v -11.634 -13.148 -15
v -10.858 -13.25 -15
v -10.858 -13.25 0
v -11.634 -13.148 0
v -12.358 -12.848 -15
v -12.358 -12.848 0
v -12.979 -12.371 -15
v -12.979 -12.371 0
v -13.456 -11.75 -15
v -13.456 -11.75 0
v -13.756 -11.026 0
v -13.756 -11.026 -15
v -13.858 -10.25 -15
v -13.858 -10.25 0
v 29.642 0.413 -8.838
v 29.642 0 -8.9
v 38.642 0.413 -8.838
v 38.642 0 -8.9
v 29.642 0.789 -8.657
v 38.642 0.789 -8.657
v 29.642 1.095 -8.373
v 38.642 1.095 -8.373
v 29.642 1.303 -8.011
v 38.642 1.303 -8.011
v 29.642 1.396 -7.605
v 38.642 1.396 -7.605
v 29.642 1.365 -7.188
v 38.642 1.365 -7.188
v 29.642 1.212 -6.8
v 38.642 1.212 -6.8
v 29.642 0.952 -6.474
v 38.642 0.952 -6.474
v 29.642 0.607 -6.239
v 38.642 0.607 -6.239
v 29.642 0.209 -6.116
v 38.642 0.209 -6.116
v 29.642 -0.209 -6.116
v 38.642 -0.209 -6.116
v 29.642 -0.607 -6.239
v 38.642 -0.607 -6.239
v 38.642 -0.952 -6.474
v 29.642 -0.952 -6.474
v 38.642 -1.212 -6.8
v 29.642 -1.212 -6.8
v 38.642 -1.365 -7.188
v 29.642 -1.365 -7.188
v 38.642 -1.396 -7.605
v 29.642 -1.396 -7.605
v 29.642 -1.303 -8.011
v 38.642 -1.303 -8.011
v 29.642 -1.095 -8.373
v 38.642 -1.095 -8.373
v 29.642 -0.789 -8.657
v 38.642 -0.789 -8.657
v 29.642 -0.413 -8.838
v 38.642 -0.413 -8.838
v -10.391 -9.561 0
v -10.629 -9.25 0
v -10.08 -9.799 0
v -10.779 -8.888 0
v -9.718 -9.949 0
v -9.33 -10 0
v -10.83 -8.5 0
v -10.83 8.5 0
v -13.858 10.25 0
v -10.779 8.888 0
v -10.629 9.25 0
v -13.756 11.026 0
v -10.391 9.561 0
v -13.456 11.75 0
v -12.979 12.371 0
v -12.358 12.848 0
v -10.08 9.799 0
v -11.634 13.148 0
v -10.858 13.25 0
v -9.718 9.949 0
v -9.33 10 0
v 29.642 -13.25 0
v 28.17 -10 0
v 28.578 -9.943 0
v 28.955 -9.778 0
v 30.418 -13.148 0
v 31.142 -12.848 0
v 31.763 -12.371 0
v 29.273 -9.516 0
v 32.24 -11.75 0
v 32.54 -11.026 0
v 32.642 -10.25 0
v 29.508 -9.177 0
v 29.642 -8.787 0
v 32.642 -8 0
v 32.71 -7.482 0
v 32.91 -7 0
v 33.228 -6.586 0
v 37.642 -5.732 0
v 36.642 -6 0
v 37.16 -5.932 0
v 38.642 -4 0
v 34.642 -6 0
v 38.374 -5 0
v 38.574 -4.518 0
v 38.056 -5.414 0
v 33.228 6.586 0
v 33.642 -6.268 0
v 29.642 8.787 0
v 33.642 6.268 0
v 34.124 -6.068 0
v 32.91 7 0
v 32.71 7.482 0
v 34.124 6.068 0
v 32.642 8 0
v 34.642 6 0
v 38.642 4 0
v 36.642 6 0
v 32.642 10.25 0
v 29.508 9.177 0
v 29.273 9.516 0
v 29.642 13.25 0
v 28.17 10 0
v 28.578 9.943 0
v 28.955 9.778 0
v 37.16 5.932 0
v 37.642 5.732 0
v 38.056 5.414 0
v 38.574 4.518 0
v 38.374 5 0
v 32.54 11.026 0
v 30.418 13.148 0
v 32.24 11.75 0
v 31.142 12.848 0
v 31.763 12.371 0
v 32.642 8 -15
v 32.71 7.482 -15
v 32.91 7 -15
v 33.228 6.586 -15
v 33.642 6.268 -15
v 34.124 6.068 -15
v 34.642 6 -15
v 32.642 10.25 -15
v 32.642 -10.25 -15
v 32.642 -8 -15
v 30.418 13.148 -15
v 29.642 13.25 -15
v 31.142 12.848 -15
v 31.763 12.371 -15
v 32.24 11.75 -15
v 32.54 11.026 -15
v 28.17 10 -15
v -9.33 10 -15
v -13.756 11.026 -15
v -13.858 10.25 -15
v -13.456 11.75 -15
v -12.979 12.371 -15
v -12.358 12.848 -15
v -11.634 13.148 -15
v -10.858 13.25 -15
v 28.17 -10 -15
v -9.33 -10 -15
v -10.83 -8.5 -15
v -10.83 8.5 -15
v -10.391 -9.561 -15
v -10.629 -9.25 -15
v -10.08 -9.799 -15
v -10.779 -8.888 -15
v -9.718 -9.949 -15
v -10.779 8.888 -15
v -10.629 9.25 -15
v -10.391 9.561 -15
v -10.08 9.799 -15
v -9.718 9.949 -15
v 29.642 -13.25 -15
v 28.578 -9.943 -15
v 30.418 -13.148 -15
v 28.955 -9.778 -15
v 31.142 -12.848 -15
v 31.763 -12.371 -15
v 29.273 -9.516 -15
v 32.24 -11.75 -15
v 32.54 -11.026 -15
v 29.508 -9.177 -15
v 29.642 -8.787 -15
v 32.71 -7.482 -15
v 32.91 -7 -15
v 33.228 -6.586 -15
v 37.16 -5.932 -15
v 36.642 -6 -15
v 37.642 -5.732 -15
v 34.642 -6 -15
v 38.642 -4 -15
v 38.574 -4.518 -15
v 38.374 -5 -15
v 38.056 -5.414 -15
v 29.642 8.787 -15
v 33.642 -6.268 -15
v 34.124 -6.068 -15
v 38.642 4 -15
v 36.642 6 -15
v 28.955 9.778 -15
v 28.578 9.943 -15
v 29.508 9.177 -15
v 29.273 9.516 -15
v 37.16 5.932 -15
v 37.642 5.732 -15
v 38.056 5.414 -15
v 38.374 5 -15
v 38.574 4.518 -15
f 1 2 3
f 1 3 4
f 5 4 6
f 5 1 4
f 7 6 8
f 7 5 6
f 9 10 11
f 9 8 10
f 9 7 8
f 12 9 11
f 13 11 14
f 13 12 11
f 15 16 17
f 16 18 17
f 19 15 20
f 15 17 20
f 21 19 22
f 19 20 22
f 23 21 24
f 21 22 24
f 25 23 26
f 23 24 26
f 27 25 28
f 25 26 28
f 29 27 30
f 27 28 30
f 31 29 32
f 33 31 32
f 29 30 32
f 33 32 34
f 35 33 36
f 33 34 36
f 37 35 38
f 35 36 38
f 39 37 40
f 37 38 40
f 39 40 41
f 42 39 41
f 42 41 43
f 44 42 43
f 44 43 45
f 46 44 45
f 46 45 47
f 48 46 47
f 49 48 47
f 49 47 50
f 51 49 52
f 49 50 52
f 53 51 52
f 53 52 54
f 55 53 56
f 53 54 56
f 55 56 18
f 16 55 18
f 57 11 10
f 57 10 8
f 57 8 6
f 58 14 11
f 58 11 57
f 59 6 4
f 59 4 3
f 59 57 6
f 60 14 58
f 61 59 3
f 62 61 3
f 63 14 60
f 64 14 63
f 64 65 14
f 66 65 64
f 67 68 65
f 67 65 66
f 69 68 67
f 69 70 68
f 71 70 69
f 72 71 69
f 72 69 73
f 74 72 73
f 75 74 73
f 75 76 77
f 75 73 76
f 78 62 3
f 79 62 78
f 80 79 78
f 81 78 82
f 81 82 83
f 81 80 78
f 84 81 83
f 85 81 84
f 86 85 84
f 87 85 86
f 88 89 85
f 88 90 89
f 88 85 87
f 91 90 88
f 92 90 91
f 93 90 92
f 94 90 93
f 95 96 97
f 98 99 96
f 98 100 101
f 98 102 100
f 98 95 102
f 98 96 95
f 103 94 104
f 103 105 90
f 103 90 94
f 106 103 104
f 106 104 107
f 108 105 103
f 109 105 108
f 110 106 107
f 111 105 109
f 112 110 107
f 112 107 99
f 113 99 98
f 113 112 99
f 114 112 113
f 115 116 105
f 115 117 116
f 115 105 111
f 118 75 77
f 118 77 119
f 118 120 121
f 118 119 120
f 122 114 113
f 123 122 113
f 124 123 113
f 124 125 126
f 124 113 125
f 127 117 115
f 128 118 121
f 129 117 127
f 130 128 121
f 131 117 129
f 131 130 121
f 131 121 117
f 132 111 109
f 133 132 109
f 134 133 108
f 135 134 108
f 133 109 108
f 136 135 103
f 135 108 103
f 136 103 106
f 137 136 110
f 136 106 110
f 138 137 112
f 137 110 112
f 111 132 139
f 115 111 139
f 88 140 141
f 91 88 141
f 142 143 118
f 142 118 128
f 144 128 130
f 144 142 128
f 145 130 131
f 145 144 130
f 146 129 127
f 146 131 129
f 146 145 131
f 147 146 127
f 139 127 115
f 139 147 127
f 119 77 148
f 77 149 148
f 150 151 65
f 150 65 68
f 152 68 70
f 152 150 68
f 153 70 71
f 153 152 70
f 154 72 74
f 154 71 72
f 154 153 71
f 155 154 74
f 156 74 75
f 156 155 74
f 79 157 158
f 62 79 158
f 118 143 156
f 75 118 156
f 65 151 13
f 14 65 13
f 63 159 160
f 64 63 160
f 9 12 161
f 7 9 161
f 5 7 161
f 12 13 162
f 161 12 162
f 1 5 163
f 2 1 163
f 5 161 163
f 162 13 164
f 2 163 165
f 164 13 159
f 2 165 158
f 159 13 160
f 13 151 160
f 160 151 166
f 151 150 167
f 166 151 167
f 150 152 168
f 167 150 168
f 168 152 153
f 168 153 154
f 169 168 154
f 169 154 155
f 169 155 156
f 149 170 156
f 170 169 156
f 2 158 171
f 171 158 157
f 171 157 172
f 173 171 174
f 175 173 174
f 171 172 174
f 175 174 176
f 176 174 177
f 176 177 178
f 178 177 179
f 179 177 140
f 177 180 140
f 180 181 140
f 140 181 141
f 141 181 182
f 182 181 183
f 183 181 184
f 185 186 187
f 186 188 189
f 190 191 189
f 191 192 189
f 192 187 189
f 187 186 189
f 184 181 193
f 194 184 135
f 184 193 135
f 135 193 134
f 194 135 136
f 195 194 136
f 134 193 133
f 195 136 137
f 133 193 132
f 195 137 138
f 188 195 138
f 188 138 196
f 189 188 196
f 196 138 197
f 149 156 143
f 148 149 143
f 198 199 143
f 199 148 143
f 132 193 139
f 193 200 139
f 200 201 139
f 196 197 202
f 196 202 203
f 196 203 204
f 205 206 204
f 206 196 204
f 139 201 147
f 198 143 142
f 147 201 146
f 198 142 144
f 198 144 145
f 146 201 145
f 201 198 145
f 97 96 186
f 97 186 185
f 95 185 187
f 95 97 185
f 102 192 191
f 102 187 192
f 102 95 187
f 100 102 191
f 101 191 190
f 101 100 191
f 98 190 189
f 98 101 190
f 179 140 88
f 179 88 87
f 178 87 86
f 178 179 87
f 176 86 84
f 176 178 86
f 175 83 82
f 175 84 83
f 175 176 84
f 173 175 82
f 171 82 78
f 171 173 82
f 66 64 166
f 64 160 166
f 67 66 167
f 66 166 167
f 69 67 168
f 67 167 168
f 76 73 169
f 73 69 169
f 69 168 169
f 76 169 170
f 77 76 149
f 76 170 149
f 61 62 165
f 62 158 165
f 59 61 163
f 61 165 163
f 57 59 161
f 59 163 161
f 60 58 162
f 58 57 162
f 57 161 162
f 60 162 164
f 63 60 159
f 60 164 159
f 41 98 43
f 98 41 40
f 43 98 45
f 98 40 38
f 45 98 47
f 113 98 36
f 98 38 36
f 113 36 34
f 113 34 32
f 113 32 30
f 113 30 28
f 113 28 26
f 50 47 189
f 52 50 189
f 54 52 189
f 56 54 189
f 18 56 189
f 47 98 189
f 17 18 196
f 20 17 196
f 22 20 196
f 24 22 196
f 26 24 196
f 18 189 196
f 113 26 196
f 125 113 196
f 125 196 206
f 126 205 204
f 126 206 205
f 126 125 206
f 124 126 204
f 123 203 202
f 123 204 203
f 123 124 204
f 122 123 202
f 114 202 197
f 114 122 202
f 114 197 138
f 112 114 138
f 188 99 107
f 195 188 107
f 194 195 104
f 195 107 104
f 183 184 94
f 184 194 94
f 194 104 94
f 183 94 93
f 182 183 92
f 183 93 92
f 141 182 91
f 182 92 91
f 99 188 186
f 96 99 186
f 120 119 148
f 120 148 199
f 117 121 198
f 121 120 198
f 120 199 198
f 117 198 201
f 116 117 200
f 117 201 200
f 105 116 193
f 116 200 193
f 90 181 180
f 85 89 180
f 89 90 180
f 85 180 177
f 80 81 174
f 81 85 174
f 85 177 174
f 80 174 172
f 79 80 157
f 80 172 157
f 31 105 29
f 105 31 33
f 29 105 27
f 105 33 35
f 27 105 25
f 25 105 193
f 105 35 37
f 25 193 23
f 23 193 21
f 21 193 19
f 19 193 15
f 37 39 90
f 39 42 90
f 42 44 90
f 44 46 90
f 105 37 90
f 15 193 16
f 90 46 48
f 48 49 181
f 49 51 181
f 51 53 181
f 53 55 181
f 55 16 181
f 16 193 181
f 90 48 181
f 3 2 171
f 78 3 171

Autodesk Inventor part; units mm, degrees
ref_plane "YZ Plane" through (0, 0, 0) normal (1, 0, 0) x (0, 1, 0)
ref_plane "XZ Plane" through (0, 0, 0) normal (0, 1, 0) x (-1, 0, 0)
ref_plane "Arbeitsebene1" through (0, 0, -15) normal (0, 0, 1) x (1, 0, 0)
sketch "Skizze1" plane through (0, 0, -15) normal (0, 0, 1) x (1, 0, 0)
  line L0 (29.6698, 8.5) -> (29.6698, -8.5)
  arc A0 (29.6698, 8.5) -> (28.1698, 10) centre (28.1698, 8.5) ccw
  line L1 (11.1698, 10) -> (28.1698, 10)
  arc A1 (11.1698, 10) -> (9.6698, 8.5) centre (11.1698, 8.5) ccw
  line L2 (9.6698, -8.5) -> (9.6698, 8.5)
  arc A2 (9.6698, -8.5) -> (11.1698, -10) centre (11.1698, -8.5) ccw
  line L3 (28.1698, -10) -> (11.1698, -10)
  arc A3 (28.1698, -10) -> (29.6698, -8.5) centre (28.1698, -8.5) ccw
  circle A4 centre (27.6698, 8) radius 0.7835
  circle A5 centre (27.6698, -8) radius 0.7835
  circle A6 centre (11.6698, 8) radius 0.7835
  circle A7 centre (11.6698, -8) radius 0.7835
  circle A8 centre (19.6698, 0) radius 7.5
  line L4 (4.2698, 10) -> (4.2698, 8.9) projected
  line L5 (-5.8302, 10) -> (4.2698, 10) projected
  line L6 (-5.8302, 8.5) -> (-5.8302, 10) projected
  arc A9 (-9.3302, 5) -> (-5.8302, 8.5) centre (-9.3302, 8.5) ccw projected
  line L7 (-10.8302, 5) -> (-9.3302, 5) projected
  line L8 (-10.8302, -5) -> (-10.8302, 5) projected
  line L9 (-9.3302, -5) -> (-10.8302, -5) projected
  arc A10 (-5.8302, -8.5) -> (-9.3302, -5) centre (-9.3302, -8.5) ccw projected
  line L10 (-5.8302, -10) -> (-5.8302, -8.5) projected
  line L11 (4.2698, -10) -> (-5.8302, -10) projected
  line L12 (4.2698, -8.9) -> (4.2698, -10) projected
  arc A11 (7.6698, -5.5) -> (4.2698, -8.9) centre (7.6698, -8.9) ccw projected
  line L13 (11.1698, -5.5) -> (7.6698, -5.5)
  line L14 (11.1698, -5) -> (11.1698, -5.5)
  line L15 (11.1698, -5) -> (7.3698, -5)
  line L16 (7.3698, -5) -> (7.3698, 5)
  line L17 (7.3698, 5) -> (11.1698, 5)
  line L18 (11.1698, 5.5) -> (11.1698, 5)
  line L19 (7.6698, 5.5) -> (11.1698, 5.5)
  arc A12 (4.2698, 8.9) -> (7.6698, 5.5) centre (7.6698, 8.9) ccw projected
  circle A13 centre (-0.8302, 0) radius 2 projected
  line L20 (9.1698, 8.5) -> (9.1698, -8.5)
  arc A14 (9.1698, 8.5) -> (7.6698, 10) centre (7.6698, 8.5) ccw
  line L21 (-9.3302, 10) -> (7.6698, 10)
  arc A15 (-9.3302, 10) -> (-10.8302, 8.5) centre (-9.3302, 8.5) ccw
  line L22 (-10.8302, -8.5) -> (-10.8302, 8.5)
  arc A16 (-10.8302, -8.5) -> (-9.3302, -10) centre (-9.3302, -8.5) ccw
  line L23 (7.6698, -10) -> (-9.3302, -10)
  arc A17 (7.6698, -10) -> (9.1698, -8.5) centre (7.6698, -8.5) ccw
  circle A18 centre (7.1698, 8) radius 0.7835
  circle A19 centre (7.1698, -8) radius 0.7835
  circle A20 centre (-8.8302, 8) radius 0.7835
  circle A21 centre (-8.8302, -8) radius 0.7835
  circle A22 centre (-0.8302, 0) radius 7.5
  line L24 (-9.3302, -5.5) -> (-12.8302, -5.5)
  line L25 (-9.3302, -5) -> (-9.3302, -5.5)
  line L26 (-9.3302, -5) -> (-13.1302, -5)
  line L27 (-13.1302, 5) -> (-9.3302, 5)
  line L28 (-9.3302, 5.5) -> (-9.3302, 5)
  line L29 (-12.8302, 5.5) -> (-9.3302, 5.5)
  line L30 (11.1698, 10) -> (7.6698, 10)
  line L31 (11.1698, -10) -> (7.6698, -10)
  line L32 (-10.858, 10.25) -> (29.642, 10.25)
  line L33 (29.642, 10.25) -> (29.642, -10.25)
  line L34 (29.642, -10.25) -> (-10.858, -10.25)
  line L35 (-10.858, -10.25) -> (-10.858, 10.25)
  line L36 (-10.858, 10.25) -> (29.642, -10.25) construction
  line L37 (29.642, 10.25) -> (-10.858, -10.25) construction
  line L38 (32.642, -10.25) -> (32.642, 10.25)
  line L39 (29.642, 13.25) -> (-10.858, 13.25)
  line L40 (-13.858, 10.25) -> (-13.858, -10.25)
  line L41 (-10.858, -13.25) -> (29.642, -13.25)
  arc A23 (32.642, 10.25) -> (29.642, 13.25) centre (29.642, 10.25) ccw
  arc A24 (29.642, -13.25) -> (32.642, -10.25) centre (29.642, -10.25) ccw
  arc A25 (-13.858, -10.25) -> (-10.858, -13.25) centre (-10.858, -10.25) ccw
  arc A26 (-10.858, 13.25) -> (-13.858, 10.25) centre (-10.858, 10.25) ccw
  line L42 (38.642, 6) -> (32.642, 6)
  line L43 (32.642, 6) -> (32.642, -6)
  line L44 (32.642, -6) -> (38.642, -6)
  line L45 (38.642, -6) -> (38.642, 6)
  line L46 (38.642, 6) -> (32.642, -6) construction
  line L47 (32.642, 6) -> (38.642, -6) construction
  point P0 (0, 0)
  point P1 (9.392, 0)
  point P2 (35.642, 0)
  point P3 (32.642, 0)
  point P4 (29.642, -8.7873)
  point P5 (29.642, 8.7873)
  dimension "d1" = 20.5
  dimension "d2" = 3
  dimension "d3" = 3
  dimension "d6" = 6
  dimension "d7" = 12
extrude "Extrusion1" add sketch "Skizze1" along normal blind 15 contours L0 A3 L33 A0 | A0 L1 L30 L21 L5 A15 L22 L29 L35 L32 L33 | L33 L34 L35 L24 L22 A16 L23 L11 L31 L3 A3 | L29 L22 L27 L35 | L35 L26 L22 L24 | L27 L8 L26 L35 | A24 L41 A25 L40 A26 L39 A23 L38 | L38 L42 L45 L44
fillet "Rundung1" radius 2 4 edges at (32.642, 6, -7.5) (38.642, 6, -7.5) (38.642, -6, -7.5) (32.642, -6, -7.5)
sketch "Skizze2" plane through (38.642, -4, -15) normal (1, 0, 0) x (0, 0, -1)
  line L0 (0, 0) -> (-15, 0) projected
  line L1 (0, 0) -> (0, 8) projected
  line L2 (-15, 8) -> (0, 8) projected
  line L3 (-15, 0) -> (-15, 8) projected
  circle A0 centre (-7.5, 4) radius 1.4
  point P0 (-15, 4)
  dimension "d9" = 2.8
extrude "Extrusion2" cut sketch "Skizze2" against normal blind 15 contours A0
properties part number "Holisheet_NEMA8_connector"
